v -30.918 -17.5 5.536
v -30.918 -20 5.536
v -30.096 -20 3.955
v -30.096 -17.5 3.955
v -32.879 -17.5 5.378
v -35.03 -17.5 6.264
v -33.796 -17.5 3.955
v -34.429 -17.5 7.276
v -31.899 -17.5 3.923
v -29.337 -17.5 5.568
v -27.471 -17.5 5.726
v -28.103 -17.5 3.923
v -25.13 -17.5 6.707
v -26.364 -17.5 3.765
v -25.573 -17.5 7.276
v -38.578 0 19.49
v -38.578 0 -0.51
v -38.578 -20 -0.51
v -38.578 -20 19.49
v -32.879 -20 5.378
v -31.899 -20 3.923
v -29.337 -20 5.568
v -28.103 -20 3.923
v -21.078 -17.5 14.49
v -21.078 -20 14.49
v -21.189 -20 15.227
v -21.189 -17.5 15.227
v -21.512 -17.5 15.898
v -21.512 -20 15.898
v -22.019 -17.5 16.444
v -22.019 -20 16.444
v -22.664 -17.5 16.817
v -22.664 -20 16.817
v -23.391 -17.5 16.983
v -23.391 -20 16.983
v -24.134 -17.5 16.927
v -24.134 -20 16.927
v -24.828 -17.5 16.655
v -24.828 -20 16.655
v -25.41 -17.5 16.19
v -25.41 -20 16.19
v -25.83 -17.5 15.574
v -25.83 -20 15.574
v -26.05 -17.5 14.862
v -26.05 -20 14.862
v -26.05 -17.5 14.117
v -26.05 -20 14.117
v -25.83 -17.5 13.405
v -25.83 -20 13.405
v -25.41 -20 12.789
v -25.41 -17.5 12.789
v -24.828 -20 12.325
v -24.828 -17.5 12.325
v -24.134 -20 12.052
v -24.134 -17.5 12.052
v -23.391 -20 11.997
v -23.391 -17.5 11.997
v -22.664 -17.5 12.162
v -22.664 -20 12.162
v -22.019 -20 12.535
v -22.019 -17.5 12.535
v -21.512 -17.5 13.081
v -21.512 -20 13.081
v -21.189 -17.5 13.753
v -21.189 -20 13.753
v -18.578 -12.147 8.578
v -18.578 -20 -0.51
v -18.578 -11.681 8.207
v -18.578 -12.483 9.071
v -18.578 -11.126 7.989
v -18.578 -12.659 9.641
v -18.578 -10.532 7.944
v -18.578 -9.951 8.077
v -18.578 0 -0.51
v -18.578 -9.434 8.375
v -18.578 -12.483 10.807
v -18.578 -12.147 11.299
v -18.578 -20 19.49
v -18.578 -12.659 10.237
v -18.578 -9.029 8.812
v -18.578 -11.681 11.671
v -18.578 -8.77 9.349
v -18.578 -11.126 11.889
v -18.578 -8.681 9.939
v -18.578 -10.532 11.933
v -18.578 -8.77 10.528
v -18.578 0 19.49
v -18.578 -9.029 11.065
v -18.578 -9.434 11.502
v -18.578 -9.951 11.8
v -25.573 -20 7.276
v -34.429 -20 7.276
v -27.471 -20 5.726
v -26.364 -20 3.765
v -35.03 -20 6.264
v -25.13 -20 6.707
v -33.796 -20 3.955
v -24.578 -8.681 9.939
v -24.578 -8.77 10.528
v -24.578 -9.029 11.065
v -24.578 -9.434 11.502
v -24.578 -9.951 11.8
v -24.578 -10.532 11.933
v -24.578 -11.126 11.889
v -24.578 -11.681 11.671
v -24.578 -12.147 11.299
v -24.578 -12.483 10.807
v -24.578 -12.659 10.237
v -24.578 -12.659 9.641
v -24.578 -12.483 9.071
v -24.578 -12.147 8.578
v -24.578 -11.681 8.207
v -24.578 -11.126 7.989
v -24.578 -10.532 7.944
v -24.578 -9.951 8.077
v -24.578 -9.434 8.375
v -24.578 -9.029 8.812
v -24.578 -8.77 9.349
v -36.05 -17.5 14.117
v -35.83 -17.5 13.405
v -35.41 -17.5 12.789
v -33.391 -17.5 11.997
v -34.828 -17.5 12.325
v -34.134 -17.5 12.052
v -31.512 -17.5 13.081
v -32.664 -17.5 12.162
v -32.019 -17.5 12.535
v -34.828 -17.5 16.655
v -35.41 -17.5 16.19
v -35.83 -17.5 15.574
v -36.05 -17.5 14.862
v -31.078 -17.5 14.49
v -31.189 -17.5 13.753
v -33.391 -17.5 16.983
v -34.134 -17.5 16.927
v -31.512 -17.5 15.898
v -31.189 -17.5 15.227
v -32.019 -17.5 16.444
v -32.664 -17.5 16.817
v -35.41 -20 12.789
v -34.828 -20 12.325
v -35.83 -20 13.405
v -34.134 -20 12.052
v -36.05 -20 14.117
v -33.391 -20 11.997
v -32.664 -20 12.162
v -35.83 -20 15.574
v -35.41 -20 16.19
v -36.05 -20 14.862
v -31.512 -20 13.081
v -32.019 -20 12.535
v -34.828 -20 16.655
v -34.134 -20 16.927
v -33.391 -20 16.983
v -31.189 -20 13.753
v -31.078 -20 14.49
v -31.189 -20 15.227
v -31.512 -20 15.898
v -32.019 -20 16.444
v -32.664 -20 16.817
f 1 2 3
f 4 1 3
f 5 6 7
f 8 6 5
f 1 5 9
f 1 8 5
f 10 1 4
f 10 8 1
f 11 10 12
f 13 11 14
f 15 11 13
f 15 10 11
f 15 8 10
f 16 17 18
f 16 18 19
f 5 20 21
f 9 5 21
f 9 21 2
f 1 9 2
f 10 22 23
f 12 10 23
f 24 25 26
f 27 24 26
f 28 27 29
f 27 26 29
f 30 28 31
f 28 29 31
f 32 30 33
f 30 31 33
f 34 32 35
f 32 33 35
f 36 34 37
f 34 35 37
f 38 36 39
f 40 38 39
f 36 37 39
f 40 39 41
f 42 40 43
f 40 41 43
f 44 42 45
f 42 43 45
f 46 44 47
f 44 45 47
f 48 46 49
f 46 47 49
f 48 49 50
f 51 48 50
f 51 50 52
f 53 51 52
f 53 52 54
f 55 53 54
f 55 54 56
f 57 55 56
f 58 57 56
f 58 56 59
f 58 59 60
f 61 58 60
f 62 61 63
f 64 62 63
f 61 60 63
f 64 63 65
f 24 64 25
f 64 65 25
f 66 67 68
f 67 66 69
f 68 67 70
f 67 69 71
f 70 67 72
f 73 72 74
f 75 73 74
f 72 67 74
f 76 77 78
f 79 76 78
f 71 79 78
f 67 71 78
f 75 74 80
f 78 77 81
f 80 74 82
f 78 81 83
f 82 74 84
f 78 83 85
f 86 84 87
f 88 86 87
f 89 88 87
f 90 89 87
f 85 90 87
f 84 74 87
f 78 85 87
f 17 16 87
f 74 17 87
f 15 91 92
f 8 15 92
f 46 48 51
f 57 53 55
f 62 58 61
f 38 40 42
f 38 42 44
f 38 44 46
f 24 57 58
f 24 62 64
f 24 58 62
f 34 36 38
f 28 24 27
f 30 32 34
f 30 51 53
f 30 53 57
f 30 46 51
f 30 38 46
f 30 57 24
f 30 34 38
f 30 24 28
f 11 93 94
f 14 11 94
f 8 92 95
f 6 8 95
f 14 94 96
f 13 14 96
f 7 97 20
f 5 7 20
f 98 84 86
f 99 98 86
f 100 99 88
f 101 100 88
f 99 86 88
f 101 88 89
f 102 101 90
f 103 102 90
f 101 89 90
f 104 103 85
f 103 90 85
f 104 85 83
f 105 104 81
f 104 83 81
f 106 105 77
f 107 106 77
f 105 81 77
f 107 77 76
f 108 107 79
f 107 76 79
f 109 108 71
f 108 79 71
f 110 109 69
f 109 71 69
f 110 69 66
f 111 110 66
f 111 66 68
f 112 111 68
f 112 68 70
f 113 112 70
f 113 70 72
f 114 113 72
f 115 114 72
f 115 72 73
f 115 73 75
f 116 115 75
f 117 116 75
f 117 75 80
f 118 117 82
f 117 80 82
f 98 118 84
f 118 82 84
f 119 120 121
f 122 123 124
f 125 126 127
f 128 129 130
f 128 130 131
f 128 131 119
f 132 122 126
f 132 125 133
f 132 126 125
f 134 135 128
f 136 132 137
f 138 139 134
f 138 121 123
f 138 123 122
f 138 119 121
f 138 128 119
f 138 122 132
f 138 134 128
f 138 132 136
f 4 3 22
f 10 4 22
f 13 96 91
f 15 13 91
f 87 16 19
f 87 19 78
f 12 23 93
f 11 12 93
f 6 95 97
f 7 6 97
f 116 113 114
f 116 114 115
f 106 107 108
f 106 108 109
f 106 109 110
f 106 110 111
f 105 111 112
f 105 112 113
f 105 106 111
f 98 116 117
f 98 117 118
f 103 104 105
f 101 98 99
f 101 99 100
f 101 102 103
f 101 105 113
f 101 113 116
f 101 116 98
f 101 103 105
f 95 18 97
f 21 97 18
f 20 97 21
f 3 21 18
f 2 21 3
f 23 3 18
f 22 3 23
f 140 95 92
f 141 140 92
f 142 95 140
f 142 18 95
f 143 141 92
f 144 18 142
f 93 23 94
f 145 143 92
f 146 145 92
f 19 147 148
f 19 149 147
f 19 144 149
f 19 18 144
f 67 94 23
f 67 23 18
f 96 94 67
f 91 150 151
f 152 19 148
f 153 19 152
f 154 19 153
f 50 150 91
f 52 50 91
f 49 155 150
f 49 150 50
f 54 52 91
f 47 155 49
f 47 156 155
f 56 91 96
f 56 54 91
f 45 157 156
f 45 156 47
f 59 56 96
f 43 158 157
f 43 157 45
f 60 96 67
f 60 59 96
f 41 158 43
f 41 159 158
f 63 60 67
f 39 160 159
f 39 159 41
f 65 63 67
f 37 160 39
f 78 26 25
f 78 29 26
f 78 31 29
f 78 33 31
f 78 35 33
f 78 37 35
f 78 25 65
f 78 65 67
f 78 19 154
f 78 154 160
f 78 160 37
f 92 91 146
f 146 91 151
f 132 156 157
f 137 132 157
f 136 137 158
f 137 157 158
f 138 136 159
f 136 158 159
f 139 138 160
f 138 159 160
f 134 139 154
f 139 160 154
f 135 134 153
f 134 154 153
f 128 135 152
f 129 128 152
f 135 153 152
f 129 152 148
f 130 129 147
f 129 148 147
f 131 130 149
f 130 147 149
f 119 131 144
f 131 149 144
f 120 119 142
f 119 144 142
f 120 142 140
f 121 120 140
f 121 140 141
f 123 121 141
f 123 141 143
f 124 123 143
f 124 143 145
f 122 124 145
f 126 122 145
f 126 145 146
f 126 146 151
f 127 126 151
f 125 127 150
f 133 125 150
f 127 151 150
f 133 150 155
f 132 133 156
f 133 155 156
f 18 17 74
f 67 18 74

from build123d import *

# Parameters (mm, degrees)
F0_W     = 20
F0_H     = 20
F1_DEPTH = 20
F2_R     = 2.5
F3_DEPTH = 2.5
F4_R     = 2.5
F5_DEPTH = 2.5
F7_DEPTH = 2.5
F8_R     = 2
F9_DEPTH = 6


with BuildPart() as f1:
    # F0 (on Front) → F1 (new body)
    with BuildSketch(Plane.XZ):
        with Locations((-28.577724, 9.489656)):
            Rectangle(F0_W, F0_H)
    extrude(amount=F1_DEPTH)

    # F2 (on face) → F3 (cut)
    with BuildSketch(Plane.XZ.offset(20)):
        with Locations((-33.577724, 14.489656)):
            Circle(F2_R)
    extrude(amount=-F3_DEPTH, mode=Mode.SUBTRACT)

    # F4 (on face) → F5 (cut)
    with BuildSketch(Plane.XZ.offset(20)):
        with Locations((-23.577724, 14.489656)):
            Circle(F4_R)
    extrude(amount=-F5_DEPTH, mode=Mode.SUBTRACT)

    # F6 (on face) → F7 (cut)
    with BuildSketch(Plane.XZ.offset(20)):
        Polygon((-34.428626, 7.275801), (-35.029531, 6.263753), (-33.796098, 3.955018), (-32.878928, 5.37821), (-31.898506, 3.923391), (-30.918086, 5.536343), (-30.095795, 3.955018), (-29.33676, 5.56797), (-28.103326, 3.923391), (-27.470795, 5.726102), (-26.363868, 3.765259), (-25.130434, 6.706524), (-25.573205, 7.275801), align=None)
    extrude(amount=-F7_DEPTH, mode=Mode.SUBTRACT)

    # F8 (on face) → F9 (cut)
    with BuildSketch(Plane.YZ.offset(-18.577724)):
        with Locations((-10.681243, 9.938739)):
            Circle(F8_R)
    extrude(amount=-F9_DEPTH, mode=Mode.SUBTRACT)


solid = f1.part
